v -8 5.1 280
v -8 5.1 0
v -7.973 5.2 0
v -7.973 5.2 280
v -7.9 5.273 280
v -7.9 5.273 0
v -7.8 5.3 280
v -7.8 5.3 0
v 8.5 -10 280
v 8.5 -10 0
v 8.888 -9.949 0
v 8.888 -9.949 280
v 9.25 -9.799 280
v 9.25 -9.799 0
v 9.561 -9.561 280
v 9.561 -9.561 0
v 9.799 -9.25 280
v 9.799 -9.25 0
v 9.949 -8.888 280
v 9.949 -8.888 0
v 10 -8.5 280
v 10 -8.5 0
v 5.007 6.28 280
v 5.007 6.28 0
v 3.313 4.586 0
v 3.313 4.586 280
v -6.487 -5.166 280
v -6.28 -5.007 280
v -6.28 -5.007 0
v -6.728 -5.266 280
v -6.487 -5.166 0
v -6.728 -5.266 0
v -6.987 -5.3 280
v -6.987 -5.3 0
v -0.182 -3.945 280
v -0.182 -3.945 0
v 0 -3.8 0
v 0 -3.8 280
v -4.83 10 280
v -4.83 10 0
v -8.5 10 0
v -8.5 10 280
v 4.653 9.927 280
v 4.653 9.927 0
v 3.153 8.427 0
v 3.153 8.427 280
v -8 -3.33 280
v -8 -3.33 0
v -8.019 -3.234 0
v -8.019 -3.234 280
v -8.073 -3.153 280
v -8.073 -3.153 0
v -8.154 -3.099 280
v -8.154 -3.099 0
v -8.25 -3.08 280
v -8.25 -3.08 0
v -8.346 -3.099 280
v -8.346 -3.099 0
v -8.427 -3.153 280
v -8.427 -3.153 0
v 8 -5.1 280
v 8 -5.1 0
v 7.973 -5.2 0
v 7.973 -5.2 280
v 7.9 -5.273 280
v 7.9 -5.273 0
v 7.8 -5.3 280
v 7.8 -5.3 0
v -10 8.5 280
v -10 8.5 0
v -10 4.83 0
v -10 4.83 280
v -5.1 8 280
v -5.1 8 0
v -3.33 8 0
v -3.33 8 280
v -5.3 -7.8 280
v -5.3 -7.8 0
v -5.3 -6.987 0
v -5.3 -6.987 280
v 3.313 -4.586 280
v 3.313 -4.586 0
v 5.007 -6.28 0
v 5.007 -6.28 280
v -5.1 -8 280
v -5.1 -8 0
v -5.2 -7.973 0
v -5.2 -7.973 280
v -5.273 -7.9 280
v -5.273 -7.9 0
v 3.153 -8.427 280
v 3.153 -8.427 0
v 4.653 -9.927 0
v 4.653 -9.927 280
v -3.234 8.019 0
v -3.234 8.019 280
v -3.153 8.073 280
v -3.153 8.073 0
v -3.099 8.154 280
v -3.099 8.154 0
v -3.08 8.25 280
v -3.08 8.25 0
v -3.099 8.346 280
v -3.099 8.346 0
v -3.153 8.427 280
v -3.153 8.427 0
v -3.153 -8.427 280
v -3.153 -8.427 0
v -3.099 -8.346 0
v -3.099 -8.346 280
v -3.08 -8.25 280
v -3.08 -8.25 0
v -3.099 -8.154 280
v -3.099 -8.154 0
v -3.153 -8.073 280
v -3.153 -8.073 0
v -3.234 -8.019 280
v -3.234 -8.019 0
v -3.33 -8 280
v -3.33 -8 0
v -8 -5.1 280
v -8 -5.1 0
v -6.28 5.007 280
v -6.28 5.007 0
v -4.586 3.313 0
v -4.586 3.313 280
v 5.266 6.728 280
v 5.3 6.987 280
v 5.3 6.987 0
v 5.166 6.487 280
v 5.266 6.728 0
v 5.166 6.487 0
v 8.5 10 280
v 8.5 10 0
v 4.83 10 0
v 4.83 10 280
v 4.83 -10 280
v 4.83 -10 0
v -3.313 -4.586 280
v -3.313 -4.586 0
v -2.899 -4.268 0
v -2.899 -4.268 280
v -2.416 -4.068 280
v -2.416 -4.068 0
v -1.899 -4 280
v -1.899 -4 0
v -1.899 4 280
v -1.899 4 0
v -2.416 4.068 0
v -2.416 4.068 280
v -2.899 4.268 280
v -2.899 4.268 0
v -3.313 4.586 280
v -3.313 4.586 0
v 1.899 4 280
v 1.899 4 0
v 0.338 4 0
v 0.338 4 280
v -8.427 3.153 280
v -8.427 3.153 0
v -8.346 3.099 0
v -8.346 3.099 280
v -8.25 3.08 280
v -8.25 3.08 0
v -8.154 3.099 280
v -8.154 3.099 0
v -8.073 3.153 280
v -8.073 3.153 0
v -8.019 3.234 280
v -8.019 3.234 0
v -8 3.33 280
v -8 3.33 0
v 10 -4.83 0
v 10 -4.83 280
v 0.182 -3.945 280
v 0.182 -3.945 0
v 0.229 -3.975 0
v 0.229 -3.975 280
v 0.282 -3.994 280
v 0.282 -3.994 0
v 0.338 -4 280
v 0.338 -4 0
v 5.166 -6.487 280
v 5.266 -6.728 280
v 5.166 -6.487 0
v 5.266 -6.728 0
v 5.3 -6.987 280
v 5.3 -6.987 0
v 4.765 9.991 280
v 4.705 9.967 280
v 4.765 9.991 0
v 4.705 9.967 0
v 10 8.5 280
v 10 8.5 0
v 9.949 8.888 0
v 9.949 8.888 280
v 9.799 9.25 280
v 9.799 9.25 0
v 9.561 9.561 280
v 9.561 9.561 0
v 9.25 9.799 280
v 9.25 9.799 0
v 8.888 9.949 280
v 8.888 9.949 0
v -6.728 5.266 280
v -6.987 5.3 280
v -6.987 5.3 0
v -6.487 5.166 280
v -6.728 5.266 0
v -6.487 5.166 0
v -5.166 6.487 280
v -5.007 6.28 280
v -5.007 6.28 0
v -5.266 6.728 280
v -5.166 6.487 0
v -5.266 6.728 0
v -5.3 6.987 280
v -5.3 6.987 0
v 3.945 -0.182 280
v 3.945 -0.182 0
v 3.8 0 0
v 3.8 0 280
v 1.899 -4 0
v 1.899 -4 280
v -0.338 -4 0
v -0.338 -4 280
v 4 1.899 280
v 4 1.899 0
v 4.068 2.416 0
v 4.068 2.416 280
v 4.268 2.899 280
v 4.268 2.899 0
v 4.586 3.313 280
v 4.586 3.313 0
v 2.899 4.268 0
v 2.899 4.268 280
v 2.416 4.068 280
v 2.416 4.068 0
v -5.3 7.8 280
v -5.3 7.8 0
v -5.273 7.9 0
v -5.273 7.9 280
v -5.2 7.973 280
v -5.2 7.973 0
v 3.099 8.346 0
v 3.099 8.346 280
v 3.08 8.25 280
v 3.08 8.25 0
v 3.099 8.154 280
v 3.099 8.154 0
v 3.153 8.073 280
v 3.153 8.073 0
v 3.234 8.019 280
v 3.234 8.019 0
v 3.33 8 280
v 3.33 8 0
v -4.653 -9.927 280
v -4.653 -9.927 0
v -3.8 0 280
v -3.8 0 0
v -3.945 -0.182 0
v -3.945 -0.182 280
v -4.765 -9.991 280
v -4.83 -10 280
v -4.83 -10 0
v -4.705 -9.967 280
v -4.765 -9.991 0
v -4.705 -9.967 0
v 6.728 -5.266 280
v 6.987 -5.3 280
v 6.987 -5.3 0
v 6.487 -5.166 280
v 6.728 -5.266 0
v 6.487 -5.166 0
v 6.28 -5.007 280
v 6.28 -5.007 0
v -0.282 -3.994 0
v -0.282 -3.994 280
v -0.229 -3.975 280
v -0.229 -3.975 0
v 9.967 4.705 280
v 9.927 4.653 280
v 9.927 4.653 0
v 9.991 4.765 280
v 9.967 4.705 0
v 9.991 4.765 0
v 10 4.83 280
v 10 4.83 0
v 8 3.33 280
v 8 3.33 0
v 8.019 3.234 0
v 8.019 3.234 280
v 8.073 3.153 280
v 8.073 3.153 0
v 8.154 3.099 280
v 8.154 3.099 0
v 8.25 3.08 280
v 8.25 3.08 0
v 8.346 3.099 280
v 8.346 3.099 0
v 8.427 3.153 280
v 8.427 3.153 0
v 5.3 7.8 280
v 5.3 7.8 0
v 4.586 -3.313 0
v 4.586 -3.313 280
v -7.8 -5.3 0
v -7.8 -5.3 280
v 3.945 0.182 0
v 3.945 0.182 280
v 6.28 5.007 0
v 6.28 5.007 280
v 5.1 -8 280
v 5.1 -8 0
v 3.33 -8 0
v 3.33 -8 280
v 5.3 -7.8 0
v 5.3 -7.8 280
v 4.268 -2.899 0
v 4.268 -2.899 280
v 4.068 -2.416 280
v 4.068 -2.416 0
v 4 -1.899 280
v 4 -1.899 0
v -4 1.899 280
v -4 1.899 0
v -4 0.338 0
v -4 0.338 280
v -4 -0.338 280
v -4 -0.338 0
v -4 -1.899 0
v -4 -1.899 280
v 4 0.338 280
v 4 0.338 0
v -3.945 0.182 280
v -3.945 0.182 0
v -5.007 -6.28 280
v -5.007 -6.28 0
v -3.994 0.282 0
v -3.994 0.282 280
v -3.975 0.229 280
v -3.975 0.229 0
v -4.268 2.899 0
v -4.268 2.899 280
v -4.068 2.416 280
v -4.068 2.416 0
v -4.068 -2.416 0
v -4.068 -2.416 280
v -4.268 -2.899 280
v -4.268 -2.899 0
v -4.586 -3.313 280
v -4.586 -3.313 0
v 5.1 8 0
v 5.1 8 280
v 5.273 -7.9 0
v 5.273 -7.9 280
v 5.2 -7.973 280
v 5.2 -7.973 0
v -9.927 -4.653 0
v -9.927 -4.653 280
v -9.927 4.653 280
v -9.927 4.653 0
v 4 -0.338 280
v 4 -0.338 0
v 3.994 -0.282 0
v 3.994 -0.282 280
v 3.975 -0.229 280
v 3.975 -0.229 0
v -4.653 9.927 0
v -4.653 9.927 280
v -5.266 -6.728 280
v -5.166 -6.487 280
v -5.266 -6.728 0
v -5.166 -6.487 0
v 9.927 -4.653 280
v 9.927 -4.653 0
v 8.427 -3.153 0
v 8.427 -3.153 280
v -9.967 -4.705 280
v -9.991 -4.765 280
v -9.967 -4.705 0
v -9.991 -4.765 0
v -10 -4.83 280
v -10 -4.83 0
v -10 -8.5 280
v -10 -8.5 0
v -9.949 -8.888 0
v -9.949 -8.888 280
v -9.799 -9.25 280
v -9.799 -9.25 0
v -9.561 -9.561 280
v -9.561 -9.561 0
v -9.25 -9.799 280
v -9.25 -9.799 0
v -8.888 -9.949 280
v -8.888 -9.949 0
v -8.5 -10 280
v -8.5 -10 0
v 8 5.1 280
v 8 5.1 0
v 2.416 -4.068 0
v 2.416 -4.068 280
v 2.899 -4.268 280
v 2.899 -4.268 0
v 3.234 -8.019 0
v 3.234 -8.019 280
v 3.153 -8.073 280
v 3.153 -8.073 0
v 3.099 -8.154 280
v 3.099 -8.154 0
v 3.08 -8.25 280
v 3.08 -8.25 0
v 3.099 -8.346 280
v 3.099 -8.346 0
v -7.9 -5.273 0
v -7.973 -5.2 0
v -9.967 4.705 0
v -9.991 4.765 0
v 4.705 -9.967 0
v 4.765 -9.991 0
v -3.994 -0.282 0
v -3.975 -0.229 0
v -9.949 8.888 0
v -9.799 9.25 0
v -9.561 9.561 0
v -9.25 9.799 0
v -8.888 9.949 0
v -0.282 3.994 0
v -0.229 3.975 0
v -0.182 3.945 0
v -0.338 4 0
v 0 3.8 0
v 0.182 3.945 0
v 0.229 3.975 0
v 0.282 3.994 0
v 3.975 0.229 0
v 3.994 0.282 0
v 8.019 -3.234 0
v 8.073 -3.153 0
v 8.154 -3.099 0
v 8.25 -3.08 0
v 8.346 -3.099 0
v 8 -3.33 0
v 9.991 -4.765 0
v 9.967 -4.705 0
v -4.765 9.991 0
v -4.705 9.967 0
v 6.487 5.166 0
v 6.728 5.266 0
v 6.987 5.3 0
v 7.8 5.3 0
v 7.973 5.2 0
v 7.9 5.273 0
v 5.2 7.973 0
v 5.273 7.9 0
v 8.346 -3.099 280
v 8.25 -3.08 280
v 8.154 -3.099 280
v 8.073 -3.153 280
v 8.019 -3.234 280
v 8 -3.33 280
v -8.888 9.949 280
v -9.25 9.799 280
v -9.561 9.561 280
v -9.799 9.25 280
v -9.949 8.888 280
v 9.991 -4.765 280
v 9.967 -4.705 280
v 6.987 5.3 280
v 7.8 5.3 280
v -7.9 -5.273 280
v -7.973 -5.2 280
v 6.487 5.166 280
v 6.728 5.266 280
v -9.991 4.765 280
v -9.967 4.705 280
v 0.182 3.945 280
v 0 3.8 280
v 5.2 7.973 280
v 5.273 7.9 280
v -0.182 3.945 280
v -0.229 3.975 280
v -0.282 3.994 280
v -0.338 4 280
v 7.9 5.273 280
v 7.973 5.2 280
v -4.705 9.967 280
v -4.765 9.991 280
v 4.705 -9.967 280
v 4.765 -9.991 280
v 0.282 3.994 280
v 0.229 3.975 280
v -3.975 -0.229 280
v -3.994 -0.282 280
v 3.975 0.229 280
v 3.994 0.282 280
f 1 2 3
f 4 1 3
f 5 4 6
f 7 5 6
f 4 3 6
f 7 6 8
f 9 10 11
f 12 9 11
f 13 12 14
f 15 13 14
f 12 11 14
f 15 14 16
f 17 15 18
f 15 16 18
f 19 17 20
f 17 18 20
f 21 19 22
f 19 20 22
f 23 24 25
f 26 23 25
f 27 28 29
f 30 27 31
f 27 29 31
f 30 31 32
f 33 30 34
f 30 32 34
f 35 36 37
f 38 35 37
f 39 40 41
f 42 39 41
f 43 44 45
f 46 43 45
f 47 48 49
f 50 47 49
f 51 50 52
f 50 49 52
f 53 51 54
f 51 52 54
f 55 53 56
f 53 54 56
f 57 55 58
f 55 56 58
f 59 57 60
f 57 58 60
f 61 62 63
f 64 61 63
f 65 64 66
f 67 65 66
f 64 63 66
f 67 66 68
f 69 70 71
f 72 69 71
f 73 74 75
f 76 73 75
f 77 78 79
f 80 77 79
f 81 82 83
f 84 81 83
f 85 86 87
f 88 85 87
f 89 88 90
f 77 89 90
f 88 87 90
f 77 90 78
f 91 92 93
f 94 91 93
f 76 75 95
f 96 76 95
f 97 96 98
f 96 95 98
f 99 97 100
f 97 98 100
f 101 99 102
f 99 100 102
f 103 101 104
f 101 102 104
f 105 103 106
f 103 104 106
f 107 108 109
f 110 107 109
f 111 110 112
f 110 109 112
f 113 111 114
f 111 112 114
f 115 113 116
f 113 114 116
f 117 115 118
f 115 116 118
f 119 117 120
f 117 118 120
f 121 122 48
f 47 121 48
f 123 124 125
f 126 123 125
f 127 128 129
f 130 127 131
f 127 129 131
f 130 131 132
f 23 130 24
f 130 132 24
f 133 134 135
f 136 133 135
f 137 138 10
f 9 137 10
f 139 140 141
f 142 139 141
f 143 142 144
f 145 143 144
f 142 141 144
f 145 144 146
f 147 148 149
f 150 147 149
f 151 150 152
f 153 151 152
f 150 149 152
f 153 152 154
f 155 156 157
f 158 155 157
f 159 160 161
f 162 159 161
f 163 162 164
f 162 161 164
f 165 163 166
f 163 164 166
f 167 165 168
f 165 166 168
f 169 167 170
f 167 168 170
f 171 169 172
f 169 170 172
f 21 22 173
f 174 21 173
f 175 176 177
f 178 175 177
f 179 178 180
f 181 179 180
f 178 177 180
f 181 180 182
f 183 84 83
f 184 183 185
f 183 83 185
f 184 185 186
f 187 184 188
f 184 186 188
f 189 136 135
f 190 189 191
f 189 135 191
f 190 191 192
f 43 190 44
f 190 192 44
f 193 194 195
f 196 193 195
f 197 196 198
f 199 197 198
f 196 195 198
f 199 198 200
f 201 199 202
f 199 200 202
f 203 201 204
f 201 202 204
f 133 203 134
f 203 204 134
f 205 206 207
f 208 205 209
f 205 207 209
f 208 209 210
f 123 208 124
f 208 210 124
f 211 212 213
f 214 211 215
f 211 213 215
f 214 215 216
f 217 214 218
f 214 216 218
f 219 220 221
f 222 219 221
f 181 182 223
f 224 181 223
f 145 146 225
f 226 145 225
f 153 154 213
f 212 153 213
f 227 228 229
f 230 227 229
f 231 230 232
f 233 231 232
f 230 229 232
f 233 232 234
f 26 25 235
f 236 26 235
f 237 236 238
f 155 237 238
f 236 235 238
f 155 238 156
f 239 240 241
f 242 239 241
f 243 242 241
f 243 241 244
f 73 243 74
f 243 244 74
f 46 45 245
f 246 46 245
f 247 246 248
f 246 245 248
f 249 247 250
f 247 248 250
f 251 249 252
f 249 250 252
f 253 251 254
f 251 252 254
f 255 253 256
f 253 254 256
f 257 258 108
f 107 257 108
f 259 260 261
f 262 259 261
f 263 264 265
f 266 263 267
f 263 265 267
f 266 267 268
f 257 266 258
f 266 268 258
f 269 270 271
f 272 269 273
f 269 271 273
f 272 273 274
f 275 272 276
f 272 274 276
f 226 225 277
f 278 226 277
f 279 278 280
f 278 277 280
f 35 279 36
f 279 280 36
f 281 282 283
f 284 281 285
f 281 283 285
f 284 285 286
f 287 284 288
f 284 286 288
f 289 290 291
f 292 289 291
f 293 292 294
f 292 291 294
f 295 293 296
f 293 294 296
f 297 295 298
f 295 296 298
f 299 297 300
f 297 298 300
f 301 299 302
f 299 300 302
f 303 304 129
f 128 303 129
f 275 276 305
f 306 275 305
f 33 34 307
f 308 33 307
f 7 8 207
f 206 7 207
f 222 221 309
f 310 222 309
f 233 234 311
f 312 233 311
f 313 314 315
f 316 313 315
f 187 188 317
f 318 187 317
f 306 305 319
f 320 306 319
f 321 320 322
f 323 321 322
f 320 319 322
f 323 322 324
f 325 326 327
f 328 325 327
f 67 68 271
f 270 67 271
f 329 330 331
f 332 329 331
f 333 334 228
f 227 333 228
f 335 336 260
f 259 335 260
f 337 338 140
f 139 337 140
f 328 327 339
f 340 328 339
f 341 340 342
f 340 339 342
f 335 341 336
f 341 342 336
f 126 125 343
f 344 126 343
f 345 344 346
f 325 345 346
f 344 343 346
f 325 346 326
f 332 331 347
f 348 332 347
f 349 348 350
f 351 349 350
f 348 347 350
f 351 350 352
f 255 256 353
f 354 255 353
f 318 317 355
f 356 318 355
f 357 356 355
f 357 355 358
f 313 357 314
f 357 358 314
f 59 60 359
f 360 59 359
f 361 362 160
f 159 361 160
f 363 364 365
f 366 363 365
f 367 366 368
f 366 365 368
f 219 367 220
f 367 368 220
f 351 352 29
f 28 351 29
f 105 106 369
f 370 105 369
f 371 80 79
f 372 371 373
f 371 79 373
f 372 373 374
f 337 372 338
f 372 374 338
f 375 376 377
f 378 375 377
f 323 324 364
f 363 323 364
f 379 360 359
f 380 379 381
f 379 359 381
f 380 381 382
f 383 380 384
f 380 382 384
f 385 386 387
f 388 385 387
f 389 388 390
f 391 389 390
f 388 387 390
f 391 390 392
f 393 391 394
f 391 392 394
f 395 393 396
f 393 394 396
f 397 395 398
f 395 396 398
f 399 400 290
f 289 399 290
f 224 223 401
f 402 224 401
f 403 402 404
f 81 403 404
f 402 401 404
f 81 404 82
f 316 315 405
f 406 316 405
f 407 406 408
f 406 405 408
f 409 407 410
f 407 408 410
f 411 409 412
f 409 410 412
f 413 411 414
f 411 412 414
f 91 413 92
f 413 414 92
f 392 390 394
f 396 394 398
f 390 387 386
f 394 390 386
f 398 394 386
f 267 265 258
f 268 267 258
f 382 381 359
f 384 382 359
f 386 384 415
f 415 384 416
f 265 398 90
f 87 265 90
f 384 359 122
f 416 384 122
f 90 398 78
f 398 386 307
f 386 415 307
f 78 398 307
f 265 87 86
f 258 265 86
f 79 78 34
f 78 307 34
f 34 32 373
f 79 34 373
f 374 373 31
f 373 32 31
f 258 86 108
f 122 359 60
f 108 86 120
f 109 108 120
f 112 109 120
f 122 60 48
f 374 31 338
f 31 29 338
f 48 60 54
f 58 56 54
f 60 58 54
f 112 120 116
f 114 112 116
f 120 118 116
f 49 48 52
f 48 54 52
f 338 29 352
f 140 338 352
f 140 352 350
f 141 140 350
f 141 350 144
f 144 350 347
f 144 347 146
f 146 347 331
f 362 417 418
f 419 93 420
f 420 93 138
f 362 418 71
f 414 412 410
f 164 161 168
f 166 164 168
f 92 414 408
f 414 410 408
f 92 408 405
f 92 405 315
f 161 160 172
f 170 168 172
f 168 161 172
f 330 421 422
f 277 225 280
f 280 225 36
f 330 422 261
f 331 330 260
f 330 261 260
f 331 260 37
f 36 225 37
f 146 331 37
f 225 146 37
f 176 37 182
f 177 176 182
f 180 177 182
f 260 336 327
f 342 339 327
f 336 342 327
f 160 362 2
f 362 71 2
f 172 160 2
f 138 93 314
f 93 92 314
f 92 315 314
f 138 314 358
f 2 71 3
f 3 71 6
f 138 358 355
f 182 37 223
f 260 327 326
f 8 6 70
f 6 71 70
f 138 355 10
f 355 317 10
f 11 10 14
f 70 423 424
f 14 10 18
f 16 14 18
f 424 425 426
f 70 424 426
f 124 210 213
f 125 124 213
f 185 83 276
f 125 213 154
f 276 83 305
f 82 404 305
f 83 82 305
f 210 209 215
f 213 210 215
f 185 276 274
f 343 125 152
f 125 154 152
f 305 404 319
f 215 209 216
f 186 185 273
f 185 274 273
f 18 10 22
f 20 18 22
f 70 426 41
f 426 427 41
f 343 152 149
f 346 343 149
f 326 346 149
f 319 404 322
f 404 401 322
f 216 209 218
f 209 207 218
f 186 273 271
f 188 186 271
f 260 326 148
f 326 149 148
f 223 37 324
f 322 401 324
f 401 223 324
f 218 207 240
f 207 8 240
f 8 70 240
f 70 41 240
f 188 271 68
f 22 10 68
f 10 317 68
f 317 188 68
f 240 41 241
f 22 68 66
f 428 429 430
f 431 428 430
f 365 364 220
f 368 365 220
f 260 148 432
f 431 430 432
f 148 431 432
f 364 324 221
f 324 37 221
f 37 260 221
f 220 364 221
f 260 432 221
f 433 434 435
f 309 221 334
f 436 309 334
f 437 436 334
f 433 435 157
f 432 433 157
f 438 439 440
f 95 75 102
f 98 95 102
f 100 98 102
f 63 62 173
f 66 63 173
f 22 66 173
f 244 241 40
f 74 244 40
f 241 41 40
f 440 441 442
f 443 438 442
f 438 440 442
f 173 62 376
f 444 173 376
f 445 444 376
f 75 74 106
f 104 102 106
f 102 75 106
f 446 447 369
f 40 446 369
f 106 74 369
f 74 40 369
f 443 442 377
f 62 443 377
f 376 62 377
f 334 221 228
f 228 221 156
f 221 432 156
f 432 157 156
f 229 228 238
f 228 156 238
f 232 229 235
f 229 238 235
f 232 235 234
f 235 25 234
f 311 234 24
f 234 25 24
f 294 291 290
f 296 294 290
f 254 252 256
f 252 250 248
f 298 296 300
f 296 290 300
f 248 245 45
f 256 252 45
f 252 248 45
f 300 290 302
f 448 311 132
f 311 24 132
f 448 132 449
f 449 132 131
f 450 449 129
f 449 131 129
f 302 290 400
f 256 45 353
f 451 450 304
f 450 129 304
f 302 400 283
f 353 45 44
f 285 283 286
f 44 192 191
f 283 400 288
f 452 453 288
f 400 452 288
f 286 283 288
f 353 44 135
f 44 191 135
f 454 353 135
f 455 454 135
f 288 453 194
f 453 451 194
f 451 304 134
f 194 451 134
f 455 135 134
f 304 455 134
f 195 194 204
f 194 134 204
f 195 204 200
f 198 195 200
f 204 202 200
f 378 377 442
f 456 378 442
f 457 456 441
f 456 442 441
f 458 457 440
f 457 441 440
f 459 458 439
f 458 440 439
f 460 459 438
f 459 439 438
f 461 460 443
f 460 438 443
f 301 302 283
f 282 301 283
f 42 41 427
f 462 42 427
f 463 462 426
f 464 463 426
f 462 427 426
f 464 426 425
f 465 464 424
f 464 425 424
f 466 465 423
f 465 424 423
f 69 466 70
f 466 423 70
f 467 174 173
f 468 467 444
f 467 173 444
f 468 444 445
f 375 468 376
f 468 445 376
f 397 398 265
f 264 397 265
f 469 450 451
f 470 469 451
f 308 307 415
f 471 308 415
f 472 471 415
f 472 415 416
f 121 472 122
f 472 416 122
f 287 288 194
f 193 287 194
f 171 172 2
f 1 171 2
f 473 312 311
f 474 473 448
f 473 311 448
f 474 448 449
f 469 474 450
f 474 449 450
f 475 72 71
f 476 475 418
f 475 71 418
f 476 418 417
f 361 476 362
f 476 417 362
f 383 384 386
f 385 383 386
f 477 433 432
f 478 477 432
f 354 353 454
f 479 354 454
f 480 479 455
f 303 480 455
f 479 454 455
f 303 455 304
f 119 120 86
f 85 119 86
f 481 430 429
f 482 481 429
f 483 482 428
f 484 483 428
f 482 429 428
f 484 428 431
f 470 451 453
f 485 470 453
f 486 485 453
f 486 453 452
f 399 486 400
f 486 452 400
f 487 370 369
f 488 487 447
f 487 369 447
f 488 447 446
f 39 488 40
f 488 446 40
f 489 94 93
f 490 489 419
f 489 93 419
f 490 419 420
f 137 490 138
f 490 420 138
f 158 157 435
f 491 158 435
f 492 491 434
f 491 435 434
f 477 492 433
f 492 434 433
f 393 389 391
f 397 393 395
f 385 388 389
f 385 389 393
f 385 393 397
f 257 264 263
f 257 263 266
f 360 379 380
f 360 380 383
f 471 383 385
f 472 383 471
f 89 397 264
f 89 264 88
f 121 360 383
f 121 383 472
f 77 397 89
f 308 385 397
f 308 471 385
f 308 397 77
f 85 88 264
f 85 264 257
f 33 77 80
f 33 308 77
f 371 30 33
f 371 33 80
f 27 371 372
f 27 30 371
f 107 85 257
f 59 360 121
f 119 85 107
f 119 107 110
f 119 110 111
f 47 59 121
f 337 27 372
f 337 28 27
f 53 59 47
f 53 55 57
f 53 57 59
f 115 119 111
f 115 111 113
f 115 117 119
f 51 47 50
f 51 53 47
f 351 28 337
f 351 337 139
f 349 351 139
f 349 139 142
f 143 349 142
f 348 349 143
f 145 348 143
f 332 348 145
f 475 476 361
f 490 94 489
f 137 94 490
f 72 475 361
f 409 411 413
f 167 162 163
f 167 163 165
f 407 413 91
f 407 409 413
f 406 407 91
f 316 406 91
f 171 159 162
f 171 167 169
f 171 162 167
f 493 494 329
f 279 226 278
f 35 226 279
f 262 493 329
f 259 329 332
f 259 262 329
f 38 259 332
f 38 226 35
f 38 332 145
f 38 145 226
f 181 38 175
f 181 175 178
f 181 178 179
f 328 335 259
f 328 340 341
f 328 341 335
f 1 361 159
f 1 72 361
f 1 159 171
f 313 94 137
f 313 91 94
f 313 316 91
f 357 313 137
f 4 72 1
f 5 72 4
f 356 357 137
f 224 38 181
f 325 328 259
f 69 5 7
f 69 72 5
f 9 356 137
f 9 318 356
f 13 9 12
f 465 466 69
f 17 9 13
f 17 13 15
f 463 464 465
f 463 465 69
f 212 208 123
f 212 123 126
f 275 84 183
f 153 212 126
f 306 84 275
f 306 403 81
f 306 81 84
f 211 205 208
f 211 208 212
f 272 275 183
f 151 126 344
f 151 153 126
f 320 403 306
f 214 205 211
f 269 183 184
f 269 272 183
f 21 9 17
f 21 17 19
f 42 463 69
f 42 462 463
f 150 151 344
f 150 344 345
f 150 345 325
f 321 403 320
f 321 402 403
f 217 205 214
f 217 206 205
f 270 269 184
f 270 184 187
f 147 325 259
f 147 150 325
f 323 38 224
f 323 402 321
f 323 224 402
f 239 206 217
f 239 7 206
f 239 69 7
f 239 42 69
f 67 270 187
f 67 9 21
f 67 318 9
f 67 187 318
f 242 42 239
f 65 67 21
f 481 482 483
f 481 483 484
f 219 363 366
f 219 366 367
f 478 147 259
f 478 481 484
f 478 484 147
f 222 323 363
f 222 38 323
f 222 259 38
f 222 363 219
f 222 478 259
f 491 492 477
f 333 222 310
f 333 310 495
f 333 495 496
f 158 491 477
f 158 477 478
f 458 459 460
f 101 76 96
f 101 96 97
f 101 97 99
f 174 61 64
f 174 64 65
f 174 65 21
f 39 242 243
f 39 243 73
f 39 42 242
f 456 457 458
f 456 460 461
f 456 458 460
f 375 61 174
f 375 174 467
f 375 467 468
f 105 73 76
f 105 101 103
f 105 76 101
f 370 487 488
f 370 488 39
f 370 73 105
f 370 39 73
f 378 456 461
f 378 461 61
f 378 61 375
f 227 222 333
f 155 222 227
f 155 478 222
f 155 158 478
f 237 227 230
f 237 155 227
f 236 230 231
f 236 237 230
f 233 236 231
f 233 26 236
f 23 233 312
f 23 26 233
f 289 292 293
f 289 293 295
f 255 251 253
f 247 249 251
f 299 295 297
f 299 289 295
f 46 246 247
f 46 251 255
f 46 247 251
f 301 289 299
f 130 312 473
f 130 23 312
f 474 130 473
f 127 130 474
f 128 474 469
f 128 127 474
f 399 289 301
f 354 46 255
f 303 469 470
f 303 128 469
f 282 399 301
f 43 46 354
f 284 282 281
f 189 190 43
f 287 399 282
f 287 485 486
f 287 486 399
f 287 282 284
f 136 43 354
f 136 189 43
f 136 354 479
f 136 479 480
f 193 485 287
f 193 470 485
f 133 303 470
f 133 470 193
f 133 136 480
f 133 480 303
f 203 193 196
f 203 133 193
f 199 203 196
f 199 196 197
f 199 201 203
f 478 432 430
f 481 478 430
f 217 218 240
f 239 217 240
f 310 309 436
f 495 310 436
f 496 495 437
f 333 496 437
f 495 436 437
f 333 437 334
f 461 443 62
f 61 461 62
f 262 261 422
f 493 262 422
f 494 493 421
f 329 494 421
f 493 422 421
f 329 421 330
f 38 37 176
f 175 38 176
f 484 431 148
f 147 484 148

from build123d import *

# Parameters (mm, degrees)
EXTRUDE_1_DEPTH = 280


# Read off the part's stored shape, not the designer's step: 222 Конструкционный профиль 20х20-1-surface1
with BuildPart() as part:
    # Эскиз1 → Бобышка-Вытянуть1 (new body)
    with BuildSketch(Plane.XY):
        with BuildLine():
            Line((-3.945217202, 0.181521503), (-3.8, 0))
            Line((-3.8, 0), (-3.945217202, -0.181521503))
            ThreePointArc((-3.945217202, -0.181521503), (-3.98590708, -0.254943529), (-4, -0.337695265))
            Line((-4, -0.337695265), (-4, -1.898780669))
            ThreePointArc((-4, -1.898780669), (-4.152240935, -2.664147534), (-4.585786438, -3.312994231))
            Line((-4.585786438, -3.312994231), (-6.279898987, -5.007106781))
            ThreePointArc((-6.279898987, -5.007106781), (-6.604322336, -5.223879533), (-6.987005769, -5.3))
            Line((-6.987005769, -5.3), (-7.8, -5.3))
            ThreePointArc((-7.8, -5.3), (-7.941421356, -5.241421356), (-8, -5.1))
            Line((-8, -5.1), (-8, -3.33))
            ThreePointArc((-8, -3.33), (-8.154329142, -3.099030117), (-8.426776695, -3.153223305))
            Line((-8.426776695, -3.153223305), (-9.926776695, -4.653223305))
            ThreePointArc((-9.926776695, -4.653223305), (-9.980969883, -4.734329142), (-10, -4.83))
            Line((-10, -4.83), (-10, -8.5))
            ThreePointArc((-10, -8.5), (-9.560660172, -9.560660172), (-8.5, -10))
            Line((-8.5, -10), (-4.83, -10))
            ThreePointArc((-4.83, -10), (-4.734329142, -9.980969883), (-4.653223305, -9.926776695))
            Line((-4.653223305, -9.926776695), (-3.153223305, -8.426776695))
            ThreePointArc((-3.153223305, -8.426776695), (-3.099030117, -8.154329142), (-3.33, -8))
            Line((-3.33, -8), (-5.1, -8))
            ThreePointArc((-5.1, -8), (-5.241421356, -7.941421356), (-5.3, -7.8))
            Line((-5.3, -7.8), (-5.3, -6.987005769))
            ThreePointArc((-5.3, -6.987005769), (-5.223879533, -6.604322336), (-5.007106781, -6.279898987))
            Line((-5.007106781, -6.279898987), (-3.312994231, -4.585786438))
            ThreePointArc((-3.312994231, -4.585786438), (-2.664147534, -4.152240935), (-1.898780669, -4))
            Line((-1.898780669, -4), (-0.337695265, -4))
            ThreePointArc((-0.337695265, -4), (-0.254943529, -3.98590708), (-0.181521503, -3.945217202))
            Line((-0.181521503, -3.945217202), (0, -3.8))
            Line((0, -3.8), (0.181521503, -3.945217202))
            ThreePointArc((0.181521503, -3.945217202), (0.254943529, -3.98590708), (0.337695265, -4))
            Line((0.337695265, -4), (1.898780669, -4))
            ThreePointArc((1.898780669, -4), (2.664147534, -4.152240935), (3.312994231, -4.585786438))
            Line((3.312994231, -4.585786438), (5.007106781, -6.279898987))
            ThreePointArc((5.007106781, -6.279898987), (5.223879533, -6.604322336), (5.3, -6.987005769))
            Line((5.3, -6.987005769), (5.3, -7.8))
            ThreePointArc((5.3, -7.8), (5.241421356, -7.941421356), (5.1, -8))
            Line((5.1, -8), (3.33, -8))
            ThreePointArc((3.33, -8), (3.099030117, -8.154329142), (3.153223305, -8.426776695))
            Line((3.153223305, -8.426776695), (4.653223305, -9.926776695))
            ThreePointArc((4.653223305, -9.926776695), (4.734329142, -9.980969883), (4.83, -10))
            Line((4.83, -10), (8.5, -10))
            ThreePointArc((8.5, -10), (9.560660172, -9.560660172), (10, -8.5))
            Line((10, -8.5), (10, -4.83))
            ThreePointArc((10, -4.83), (9.980969883, -4.734329142), (9.926776695, -4.653223305))
            Line((9.926776695, -4.653223305), (8.426776695, -3.153223305))
            ThreePointArc((8.426776695, -3.153223305), (8.154329142, -3.099030117), (8, -3.33))
            Line((8, -3.33), (8, -5.1))
            ThreePointArc((8, -5.1), (7.941421356, -5.241421356), (7.8, -5.3))
            Line((7.8, -5.3), (6.987005769, -5.3))
            ThreePointArc((6.987005769, -5.3), (6.604322336, -5.223879533), (6.279898987, -5.007106781))
            Line((6.279898987, -5.007106781), (4.585786438, -3.312994231))
            ThreePointArc((4.585786438, -3.312994231), (4.152240935, -2.664147534), (4, -1.898780669))
            Line((4, -1.898780669), (4, -0.337695265))
            ThreePointArc((4, -0.337695265), (3.98590708, -0.254943529), (3.945217202, -0.181521503))
            Line((3.945217202, -0.181521503), (3.8, 0))
            Line((3.8, 0), (3.945217202, 0.181521503))
            ThreePointArc((3.945217202, 0.181521503), (3.98590708, 0.254943529), (4, 0.337695265))
            Line((4, 0.337695265), (4, 1.898780669))
            ThreePointArc((4, 1.898780669), (4.152240935, 2.664147534), (4.585786438, 3.312994231))
            Line((4.585786438, 3.312994231), (6.279898987, 5.007106781))
            ThreePointArc((6.279898987, 5.007106781), (6.604322336, 5.223879533), (6.987005769, 5.3))
            Line((6.987005769, 5.3), (7.8, 5.3))
            ThreePointArc((7.8, 5.3), (7.941421356, 5.241421356), (8, 5.1))
            Line((8, 5.1), (8, 3.33))
            ThreePointArc((8, 3.33), (8.154329142, 3.099030117), (8.426776695, 3.153223305))
            Line((8.426776695, 3.153223305), (9.926776695, 4.653223305))
            ThreePointArc((9.926776695, 4.653223305), (9.980969883, 4.734329142), (10, 4.83))
            Line((10, 4.83), (10, 8.5))
            ThreePointArc((10, 8.5), (9.560660172, 9.560660172), (8.5, 10))
            Line((8.5, 10), (4.83, 10))
            ThreePointArc((4.83, 10), (4.734329142, 9.980969883), (4.653223305, 9.926776695))
            Line((4.653223305, 9.926776695), (3.153223305, 8.426776695))
            ThreePointArc((3.153223305, 8.426776695), (3.099030117, 8.154329142), (3.33, 8))
            Line((3.33, 8), (5.1, 8))
            ThreePointArc((5.1, 8), (5.241421356, 7.941421356), (5.3, 7.8))
            Line((5.3, 7.8), (5.3, 6.987005769))
            ThreePointArc((5.3, 6.987005769), (5.223879533, 6.604322336), (5.007106781, 6.279898987))
            Line((5.007106781, 6.279898987), (3.312994231, 4.585786438))
            ThreePointArc((3.312994231, 4.585786438), (2.664147534, 4.152240935), (1.898780669, 4))
            Line((1.898780669, 4), (0.337695265, 4))
            ThreePointArc((0.337695265, 4), (0.254943529, 3.98590708), (0.181521503, 3.945217202))
            Line((0.181521503, 3.945217202), (0, 3.8))
            Line((0, 3.8), (-0.181521503, 3.945217202))
            ThreePointArc((-0.181521503, 3.945217202), (-0.254943529, 3.98590708), (-0.337695265, 4))
            Line((-0.337695265, 4), (-1.898780669, 4))
            ThreePointArc((-1.898780669, 4), (-2.664147534, 4.152240935), (-3.312994231, 4.585786438))
            Line((-3.312994231, 4.585786438), (-5.007106781, 6.279898987))
            ThreePointArc((-5.007106781, 6.279898987), (-5.223879533, 6.604322336), (-5.3, 6.987005769))
            Line((-5.3, 6.987005769), (-5.3, 7.8))
            ThreePointArc((-5.3, 7.8), (-5.241421356, 7.941421356), (-5.1, 8))
            Line((-5.1, 8), (-3.33, 8))
            ThreePointArc((-3.33, 8), (-3.099030117, 8.154329142), (-3.153223305, 8.426776695))
            Line((-3.153223305, 8.426776695), (-4.653223305, 9.926776695))
            ThreePointArc((-4.653223305, 9.926776695), (-4.734329142, 9.980969883), (-4.83, 10))
            Line((-4.83, 10), (-8.5, 10))
            ThreePointArc((-8.5, 10), (-9.560660172, 9.560660172), (-10, 8.5))
            Line((-10, 8.5), (-10, 4.83))
            ThreePointArc((-10, 4.83), (-9.980969883, 4.734329142), (-9.926776695, 4.653223305))
            Line((-9.926776695, 4.653223305), (-8.426776695, 3.153223305))
            ThreePointArc((-8.426776695, 3.153223305), (-8.154329142, 3.099030117), (-8, 3.33))
            Line((-8, 3.33), (-8, 5.1))
            ThreePointArc((-8, 5.1), (-7.941421356, 5.241421356), (-7.8, 5.3))
            Line((-7.8, 5.3), (-6.987005769, 5.3))
            ThreePointArc((-6.987005769, 5.3), (-6.604322336, 5.223879533), (-6.279898987, 5.007106781))
            Line((-6.279898987, 5.007106781), (-4.585786438, 3.312994231))
            ThreePointArc((-4.585786438, 3.312994231), (-4.152240935, 2.664147534), (-4, 1.898780669))
            Line((-4, 1.898780669), (-4, 0.337695265))
            ThreePointArc((-4, 0.337695265), (-3.98590708, 0.254943529), (-3.945217202, 0.181521503))
        make_face()
    extrude(amount=EXTRUDE_1_DEPTH)


solid = part.part
